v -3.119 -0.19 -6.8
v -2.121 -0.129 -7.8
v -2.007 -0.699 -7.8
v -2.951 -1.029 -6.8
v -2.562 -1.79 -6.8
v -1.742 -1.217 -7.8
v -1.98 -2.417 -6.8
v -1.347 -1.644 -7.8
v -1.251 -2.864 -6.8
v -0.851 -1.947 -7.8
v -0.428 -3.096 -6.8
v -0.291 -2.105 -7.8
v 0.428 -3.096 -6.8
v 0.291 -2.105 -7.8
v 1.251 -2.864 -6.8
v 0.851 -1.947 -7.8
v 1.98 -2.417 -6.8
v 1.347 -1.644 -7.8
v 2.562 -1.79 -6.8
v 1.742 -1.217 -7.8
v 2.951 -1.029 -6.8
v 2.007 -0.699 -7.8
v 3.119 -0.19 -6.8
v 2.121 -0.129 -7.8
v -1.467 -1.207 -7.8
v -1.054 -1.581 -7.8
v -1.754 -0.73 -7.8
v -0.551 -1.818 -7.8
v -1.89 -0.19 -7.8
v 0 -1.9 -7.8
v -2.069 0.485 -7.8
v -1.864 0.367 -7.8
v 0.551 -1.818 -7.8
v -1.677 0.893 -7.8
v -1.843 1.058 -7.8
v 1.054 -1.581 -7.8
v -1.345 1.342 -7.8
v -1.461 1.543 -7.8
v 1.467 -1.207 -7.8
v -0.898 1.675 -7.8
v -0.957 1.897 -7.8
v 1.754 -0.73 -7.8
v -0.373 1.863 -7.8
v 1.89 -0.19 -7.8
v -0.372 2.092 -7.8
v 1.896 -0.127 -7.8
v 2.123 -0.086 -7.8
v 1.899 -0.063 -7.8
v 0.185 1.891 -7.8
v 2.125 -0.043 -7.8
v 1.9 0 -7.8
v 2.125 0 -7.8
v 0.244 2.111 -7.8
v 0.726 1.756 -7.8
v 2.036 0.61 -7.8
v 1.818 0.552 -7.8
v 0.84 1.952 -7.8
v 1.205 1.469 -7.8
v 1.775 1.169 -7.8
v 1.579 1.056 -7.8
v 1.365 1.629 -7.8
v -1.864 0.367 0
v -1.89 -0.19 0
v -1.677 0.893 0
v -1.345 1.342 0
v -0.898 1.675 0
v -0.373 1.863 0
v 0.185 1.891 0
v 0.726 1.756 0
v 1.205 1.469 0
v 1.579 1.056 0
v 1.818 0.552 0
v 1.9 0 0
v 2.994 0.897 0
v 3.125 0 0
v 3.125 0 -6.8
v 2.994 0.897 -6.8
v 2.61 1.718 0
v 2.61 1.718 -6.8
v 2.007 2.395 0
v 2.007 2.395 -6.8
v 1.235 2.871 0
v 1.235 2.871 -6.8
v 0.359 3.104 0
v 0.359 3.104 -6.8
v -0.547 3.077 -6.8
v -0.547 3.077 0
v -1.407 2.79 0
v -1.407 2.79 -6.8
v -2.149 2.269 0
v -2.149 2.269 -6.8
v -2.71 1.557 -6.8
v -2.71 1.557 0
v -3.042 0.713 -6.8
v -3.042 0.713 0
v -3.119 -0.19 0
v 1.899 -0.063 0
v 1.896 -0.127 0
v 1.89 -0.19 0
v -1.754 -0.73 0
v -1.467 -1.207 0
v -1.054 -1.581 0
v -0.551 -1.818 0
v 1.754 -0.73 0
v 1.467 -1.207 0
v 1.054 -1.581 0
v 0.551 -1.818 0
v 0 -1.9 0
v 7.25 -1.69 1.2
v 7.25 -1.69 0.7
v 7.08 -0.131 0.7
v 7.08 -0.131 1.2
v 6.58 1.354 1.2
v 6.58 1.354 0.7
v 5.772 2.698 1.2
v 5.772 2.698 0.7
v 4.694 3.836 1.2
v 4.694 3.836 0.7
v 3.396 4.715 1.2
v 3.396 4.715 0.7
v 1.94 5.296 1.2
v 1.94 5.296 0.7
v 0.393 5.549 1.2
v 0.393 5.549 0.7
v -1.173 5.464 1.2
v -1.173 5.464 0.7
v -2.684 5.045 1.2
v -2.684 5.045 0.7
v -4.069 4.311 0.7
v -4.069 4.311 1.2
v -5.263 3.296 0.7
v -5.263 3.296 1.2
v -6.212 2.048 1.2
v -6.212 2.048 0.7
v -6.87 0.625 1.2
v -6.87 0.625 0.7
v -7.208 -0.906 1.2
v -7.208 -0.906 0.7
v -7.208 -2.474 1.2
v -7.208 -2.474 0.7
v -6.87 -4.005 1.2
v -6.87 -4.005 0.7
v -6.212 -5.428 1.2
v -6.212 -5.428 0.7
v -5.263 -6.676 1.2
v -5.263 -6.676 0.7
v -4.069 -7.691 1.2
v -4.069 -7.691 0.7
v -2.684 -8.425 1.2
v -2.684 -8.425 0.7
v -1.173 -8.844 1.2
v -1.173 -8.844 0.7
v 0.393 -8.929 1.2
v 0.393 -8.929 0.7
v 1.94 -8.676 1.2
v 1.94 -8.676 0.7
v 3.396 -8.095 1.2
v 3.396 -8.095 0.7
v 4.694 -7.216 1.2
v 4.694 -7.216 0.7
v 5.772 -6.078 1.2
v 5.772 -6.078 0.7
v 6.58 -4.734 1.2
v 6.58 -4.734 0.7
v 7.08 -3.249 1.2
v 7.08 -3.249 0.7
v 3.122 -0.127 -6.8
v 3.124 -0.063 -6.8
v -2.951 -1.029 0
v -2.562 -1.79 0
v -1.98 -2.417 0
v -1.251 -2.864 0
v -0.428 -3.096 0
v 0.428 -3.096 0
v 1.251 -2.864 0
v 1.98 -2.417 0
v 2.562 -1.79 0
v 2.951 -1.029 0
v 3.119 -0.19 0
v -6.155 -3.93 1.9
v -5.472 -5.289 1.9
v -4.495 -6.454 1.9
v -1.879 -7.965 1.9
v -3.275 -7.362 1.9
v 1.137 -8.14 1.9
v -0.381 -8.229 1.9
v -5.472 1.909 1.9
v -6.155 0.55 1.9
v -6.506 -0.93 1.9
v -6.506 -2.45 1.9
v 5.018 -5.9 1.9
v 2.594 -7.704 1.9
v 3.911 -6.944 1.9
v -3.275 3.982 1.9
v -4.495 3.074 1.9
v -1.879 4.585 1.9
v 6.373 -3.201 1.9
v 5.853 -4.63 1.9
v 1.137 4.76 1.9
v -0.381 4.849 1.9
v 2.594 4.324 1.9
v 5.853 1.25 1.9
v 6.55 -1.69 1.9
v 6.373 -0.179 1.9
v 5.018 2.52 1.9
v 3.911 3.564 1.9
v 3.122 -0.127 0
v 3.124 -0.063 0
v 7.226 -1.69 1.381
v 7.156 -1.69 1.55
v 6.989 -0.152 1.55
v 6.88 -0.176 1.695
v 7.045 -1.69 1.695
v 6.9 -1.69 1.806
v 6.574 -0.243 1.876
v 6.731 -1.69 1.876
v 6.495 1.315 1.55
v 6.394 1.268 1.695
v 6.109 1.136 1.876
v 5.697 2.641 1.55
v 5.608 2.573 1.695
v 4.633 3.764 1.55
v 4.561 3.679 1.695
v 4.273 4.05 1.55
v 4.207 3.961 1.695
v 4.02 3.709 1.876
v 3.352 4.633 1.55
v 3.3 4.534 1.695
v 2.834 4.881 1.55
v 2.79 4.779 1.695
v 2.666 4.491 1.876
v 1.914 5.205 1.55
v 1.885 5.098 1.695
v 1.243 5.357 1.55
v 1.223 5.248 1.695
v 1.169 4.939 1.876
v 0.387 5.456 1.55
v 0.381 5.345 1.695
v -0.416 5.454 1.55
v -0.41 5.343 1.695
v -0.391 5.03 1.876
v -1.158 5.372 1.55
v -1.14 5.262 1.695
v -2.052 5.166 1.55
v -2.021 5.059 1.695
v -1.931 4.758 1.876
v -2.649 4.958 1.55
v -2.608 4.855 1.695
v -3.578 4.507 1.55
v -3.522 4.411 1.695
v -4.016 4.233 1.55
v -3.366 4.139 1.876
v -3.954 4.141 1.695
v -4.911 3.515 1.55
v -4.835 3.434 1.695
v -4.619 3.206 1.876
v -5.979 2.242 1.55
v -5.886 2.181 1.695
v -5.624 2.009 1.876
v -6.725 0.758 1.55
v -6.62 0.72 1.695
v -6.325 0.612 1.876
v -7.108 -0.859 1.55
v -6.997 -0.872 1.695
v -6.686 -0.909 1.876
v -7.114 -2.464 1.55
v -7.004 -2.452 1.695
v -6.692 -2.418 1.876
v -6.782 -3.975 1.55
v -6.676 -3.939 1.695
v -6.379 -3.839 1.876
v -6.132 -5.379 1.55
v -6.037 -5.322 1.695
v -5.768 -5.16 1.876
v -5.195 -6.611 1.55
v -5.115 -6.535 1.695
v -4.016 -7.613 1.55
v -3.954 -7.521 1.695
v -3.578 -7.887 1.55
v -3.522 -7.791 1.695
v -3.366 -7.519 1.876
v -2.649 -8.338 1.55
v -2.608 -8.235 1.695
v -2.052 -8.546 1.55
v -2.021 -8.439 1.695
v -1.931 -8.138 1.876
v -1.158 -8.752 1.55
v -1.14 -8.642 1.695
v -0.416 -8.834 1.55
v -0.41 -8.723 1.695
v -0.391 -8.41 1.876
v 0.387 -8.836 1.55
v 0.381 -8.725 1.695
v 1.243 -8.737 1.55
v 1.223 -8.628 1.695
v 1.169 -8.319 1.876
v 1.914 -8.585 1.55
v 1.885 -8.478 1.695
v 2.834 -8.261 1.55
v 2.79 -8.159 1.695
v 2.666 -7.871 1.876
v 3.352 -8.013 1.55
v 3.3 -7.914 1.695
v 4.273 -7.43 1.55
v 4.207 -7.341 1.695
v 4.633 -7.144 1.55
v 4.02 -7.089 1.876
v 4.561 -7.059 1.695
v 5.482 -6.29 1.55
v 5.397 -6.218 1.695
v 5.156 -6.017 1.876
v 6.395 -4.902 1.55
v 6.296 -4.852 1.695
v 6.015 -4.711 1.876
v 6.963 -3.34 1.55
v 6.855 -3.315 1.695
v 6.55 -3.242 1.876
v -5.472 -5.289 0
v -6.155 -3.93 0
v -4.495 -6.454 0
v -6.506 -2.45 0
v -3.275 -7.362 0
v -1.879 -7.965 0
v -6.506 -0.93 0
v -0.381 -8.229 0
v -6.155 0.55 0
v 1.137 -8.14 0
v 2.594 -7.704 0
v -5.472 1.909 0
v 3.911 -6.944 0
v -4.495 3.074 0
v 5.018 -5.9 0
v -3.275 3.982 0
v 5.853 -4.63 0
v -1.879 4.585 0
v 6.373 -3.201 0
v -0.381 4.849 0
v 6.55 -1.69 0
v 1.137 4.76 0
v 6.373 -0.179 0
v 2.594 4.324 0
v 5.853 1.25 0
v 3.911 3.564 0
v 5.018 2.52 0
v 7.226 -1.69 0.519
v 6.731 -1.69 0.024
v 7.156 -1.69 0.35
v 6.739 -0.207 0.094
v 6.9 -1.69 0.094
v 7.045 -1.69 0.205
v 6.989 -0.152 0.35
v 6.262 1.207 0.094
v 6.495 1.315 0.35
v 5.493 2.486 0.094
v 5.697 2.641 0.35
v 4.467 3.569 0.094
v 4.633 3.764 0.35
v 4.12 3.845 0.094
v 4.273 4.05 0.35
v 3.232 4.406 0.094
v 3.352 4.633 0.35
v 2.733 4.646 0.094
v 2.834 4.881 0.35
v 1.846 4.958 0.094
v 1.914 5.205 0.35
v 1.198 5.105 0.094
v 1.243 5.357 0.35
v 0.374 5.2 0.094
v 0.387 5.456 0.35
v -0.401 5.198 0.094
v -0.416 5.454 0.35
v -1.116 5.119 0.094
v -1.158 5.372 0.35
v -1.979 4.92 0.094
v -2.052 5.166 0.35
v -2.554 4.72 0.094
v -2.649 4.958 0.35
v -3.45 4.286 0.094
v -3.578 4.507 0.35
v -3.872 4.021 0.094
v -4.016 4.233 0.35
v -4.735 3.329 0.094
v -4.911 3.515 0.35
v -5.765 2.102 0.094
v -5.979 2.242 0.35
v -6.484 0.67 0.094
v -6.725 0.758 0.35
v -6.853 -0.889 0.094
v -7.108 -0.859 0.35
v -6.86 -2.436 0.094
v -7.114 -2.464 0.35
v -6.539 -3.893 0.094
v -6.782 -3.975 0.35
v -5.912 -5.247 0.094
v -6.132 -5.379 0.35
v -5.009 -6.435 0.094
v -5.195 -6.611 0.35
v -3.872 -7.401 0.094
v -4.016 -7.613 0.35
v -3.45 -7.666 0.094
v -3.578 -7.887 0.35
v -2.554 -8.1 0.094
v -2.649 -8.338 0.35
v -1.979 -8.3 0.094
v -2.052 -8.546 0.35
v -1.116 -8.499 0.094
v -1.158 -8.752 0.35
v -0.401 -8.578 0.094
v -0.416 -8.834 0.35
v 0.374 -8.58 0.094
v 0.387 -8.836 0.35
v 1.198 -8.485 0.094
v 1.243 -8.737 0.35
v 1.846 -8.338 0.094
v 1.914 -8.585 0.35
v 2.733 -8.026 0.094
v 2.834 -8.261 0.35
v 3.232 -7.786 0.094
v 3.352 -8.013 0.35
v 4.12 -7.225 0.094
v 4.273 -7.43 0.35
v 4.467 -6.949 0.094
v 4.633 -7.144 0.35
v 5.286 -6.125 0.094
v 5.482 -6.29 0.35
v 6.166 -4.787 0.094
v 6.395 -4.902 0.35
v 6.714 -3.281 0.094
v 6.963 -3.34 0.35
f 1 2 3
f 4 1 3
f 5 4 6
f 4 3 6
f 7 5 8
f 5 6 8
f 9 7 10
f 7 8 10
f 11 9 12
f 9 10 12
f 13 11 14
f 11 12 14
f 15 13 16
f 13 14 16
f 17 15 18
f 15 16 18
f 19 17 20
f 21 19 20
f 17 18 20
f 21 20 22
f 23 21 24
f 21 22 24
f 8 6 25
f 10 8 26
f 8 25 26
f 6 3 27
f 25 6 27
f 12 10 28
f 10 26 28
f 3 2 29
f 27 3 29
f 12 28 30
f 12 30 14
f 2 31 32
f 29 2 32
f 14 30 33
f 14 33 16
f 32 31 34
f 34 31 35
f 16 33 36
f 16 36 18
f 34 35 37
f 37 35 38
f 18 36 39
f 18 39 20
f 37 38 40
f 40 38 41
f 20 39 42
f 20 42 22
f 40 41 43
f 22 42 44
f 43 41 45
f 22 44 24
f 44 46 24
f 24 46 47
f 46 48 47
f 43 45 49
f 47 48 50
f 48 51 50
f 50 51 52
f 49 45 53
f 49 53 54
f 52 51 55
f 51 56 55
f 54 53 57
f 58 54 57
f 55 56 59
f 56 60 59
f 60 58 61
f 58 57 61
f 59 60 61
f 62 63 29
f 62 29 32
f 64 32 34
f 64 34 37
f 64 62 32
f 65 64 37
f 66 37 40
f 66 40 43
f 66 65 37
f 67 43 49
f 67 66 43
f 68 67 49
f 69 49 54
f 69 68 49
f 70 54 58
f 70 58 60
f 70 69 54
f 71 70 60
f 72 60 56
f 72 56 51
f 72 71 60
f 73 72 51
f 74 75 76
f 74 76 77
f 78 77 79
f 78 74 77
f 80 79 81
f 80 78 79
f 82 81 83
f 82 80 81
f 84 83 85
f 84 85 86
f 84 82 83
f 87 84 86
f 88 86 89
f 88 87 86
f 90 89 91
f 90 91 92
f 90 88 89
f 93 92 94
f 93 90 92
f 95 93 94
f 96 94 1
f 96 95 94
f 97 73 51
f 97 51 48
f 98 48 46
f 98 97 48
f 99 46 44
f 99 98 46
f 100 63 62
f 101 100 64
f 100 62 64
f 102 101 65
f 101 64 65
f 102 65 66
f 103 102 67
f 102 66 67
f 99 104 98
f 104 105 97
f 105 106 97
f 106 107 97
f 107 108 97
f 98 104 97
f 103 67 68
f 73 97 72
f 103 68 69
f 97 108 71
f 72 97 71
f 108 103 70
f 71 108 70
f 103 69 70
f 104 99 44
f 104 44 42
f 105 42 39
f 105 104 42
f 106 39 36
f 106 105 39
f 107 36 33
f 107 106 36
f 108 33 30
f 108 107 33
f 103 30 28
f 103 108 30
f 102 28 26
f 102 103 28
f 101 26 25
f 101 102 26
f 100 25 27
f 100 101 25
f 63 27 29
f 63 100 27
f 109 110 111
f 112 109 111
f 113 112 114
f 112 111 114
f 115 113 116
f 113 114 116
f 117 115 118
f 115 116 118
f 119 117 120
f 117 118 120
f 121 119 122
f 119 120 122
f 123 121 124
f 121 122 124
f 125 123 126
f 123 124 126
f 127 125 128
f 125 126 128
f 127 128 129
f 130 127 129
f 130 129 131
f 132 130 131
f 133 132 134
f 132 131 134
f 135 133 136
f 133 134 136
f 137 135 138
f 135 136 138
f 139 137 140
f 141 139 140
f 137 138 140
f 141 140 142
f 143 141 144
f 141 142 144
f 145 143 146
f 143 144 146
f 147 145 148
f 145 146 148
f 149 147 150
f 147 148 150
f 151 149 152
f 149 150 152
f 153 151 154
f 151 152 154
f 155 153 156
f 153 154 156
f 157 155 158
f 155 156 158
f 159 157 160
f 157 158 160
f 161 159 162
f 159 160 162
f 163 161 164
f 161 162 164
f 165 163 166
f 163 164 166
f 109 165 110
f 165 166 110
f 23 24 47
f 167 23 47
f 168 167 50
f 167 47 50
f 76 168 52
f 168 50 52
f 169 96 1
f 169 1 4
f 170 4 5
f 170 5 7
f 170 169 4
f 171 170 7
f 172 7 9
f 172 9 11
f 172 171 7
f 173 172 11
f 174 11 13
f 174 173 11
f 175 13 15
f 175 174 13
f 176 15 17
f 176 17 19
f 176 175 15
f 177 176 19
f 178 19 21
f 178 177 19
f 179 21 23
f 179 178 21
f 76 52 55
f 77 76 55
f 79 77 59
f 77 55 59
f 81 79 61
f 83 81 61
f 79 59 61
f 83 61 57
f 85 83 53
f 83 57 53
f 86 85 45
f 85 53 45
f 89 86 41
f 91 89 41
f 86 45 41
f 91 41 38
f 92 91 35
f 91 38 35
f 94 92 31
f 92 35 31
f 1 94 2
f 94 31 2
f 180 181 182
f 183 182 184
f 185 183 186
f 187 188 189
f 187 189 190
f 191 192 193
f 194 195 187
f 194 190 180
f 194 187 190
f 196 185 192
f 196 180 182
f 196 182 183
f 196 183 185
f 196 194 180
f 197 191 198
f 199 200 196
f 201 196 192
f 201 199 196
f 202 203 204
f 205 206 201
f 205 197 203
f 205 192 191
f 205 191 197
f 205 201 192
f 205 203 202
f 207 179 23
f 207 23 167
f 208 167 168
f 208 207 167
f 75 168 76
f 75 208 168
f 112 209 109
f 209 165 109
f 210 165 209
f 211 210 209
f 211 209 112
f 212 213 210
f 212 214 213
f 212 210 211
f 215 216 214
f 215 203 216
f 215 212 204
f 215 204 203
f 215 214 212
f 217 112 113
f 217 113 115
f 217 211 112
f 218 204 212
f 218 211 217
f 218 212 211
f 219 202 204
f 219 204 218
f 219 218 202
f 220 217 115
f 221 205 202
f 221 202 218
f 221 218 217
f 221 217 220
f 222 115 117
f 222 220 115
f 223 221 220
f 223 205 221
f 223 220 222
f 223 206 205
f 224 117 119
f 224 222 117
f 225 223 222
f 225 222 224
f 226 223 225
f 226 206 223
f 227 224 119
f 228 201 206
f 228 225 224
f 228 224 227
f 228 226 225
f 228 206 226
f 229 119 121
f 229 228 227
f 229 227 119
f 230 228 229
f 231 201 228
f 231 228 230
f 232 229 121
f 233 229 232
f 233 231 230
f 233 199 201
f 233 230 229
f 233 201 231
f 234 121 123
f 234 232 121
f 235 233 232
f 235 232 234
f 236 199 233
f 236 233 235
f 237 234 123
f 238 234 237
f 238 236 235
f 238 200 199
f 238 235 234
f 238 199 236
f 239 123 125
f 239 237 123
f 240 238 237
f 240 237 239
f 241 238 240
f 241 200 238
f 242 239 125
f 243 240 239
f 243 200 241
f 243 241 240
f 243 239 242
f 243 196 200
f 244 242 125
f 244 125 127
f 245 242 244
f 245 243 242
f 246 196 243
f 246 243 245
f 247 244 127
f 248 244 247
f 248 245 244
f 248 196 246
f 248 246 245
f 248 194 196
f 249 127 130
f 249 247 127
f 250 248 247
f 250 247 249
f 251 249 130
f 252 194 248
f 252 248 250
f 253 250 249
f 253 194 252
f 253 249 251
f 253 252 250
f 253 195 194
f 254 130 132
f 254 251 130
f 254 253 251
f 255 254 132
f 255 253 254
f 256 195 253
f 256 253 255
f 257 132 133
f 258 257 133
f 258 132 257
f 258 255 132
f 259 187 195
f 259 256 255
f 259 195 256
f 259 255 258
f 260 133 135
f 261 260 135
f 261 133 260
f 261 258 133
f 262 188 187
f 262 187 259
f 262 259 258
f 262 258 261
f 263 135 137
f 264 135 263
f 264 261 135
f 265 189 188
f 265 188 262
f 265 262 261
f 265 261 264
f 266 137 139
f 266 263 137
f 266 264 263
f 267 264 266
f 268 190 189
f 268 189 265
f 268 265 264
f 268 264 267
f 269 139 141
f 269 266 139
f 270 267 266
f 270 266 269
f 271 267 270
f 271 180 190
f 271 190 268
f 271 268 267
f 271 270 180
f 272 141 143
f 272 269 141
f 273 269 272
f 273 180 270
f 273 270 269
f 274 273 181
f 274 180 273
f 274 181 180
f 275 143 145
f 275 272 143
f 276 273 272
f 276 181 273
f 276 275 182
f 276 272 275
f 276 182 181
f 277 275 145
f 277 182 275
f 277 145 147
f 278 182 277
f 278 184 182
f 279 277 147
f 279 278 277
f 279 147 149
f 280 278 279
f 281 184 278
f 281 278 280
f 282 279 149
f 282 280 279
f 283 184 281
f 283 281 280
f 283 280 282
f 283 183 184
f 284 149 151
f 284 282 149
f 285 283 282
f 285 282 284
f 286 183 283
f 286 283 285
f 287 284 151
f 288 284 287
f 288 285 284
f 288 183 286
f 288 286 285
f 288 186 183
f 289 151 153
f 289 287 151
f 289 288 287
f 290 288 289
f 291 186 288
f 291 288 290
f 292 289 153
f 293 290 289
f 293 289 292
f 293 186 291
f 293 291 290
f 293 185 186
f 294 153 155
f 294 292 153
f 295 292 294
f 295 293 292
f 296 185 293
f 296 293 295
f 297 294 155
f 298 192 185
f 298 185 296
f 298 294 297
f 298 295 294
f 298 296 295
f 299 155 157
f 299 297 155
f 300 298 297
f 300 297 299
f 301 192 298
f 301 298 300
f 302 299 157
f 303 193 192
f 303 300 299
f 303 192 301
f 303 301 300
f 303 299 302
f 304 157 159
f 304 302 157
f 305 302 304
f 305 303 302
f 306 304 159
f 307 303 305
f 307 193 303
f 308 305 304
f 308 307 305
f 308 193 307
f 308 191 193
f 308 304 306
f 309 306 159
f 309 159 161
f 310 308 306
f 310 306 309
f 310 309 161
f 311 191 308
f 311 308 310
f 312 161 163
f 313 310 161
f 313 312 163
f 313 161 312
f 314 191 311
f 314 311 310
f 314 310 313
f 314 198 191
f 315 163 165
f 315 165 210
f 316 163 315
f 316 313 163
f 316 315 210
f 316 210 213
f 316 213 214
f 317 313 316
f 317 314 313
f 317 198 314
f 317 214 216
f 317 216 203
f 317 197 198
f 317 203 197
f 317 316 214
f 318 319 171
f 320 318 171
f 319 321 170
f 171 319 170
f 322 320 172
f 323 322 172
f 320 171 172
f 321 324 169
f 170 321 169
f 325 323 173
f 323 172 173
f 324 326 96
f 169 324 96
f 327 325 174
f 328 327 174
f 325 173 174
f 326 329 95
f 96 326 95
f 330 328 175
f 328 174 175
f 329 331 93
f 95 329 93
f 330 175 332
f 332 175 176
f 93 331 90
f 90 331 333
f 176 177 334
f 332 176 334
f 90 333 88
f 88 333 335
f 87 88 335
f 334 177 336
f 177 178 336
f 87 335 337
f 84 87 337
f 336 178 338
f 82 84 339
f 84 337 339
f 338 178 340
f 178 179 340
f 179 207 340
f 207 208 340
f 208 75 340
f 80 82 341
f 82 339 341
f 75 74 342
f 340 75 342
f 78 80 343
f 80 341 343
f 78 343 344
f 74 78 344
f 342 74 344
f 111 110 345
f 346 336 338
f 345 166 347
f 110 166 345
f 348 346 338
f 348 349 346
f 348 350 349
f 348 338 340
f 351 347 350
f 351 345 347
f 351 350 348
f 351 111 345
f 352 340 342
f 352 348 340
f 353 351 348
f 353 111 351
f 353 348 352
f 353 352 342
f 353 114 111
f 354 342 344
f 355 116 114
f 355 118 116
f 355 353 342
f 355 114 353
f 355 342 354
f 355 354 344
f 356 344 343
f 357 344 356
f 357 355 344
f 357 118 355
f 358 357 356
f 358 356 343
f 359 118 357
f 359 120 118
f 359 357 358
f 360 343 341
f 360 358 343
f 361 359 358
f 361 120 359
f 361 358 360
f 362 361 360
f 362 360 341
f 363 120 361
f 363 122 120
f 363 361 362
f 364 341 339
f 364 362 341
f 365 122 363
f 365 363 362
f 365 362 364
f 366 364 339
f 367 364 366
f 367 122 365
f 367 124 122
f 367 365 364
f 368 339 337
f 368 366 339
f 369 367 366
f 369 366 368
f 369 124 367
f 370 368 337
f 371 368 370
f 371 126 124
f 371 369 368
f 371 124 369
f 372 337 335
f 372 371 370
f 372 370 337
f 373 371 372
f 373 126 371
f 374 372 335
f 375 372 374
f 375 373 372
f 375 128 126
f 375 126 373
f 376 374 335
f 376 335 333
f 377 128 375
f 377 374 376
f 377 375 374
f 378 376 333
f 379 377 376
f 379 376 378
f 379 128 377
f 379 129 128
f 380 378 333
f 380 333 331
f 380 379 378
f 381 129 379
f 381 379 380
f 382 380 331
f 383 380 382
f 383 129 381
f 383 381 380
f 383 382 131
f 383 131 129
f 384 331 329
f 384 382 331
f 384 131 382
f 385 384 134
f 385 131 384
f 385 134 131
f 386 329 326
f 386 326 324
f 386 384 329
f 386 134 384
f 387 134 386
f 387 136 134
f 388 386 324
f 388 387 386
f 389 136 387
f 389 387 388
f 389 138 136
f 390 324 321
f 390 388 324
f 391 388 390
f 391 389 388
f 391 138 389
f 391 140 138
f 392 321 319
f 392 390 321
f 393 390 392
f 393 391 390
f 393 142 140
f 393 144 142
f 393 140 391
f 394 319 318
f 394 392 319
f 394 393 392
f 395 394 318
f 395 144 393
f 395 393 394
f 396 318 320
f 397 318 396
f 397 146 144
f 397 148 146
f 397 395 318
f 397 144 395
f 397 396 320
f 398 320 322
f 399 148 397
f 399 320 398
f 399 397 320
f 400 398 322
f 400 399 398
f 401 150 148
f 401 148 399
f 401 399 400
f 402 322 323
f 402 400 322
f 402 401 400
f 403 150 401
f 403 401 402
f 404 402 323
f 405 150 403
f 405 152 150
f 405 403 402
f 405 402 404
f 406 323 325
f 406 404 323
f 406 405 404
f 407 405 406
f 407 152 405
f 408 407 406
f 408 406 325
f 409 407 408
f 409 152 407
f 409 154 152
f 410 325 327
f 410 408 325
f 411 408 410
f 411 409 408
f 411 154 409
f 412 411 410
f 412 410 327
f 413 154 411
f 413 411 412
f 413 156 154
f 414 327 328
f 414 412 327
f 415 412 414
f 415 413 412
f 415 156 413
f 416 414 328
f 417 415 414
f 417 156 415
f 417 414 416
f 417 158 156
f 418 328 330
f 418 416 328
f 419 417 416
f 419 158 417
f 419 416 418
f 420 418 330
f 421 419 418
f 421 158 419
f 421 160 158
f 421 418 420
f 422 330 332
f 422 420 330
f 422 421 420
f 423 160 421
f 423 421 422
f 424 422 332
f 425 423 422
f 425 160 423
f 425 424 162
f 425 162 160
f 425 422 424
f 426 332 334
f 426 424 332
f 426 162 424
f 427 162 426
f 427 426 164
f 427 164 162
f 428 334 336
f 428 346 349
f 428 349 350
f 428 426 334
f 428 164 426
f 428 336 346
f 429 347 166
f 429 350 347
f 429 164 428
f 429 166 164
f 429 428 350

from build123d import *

# Parameters (mm, degrees)
F1_DEPTH = 7.8
F0_R     = 7.25
F2_DEPTH = 1.9
F3_SIZE  = 1
F4_R     = 0.7


# Not quite as in the source:
# - a feature names something its author has since deleted; it is built from what else it names


with BuildPart() as f1:
    # F0 (on Top) → F1 (new body)
    with BuildSketch(Plane.XY):
        with BuildLine():
            ThreePointArc((1.8904761229, -0.1900000758), (0, -1.9), (-1.8904761229, -0.1900000758))
            Line((-1.8904761229, -0.1900000758), (-3.1192186475, -0.1900000758))
            ThreePointArc((-3.1192186475, -0.1900000758), (0, -3.125), (3.1192186475, -0.1900000758))
            Line((3.1192186475, -0.1900000758), (1.8904761229, -0.1900000758))
        make_face()
        with BuildLine():
            ThreePointArc((-1.8904761229, -0.1900000758), (-0.0951193107, 1.897617537), (1.9, 0))
            ThreePointArc((1.9, 0), (1.897617537, -0.0951193107), (1.8904761229, -0.1900000758))
            Line((1.8904761229, -0.1900000758), (3.1192186475, -0.1900000758))
            ThreePointArc((3.1192186475, -0.1900000758), (3.1235543275, -0.0950440067), (3.125, 0))
            ThreePointArc((3.125, 0), (-0.0950440067, 3.1235543275), (-3.1192186475, -0.1900000758))
            Line((-3.1192186475, -0.1900000758), (-1.8904761229, -0.1900000758))
        make_face()
    extrude(amount=-F1_DEPTH)

    # F0 (on Top) → F2 (join)
    with BuildSketch(Plane.XY):
        with Locations((2.98e-08, -1.6900000758)):
            Circle(F0_R)
        Polygon((2.5797043927, -5.2021308802), (0, -7.9360147938), (-2.5797043927, -5.2021308802), align=None, mode=Mode.SUBTRACT)
        with BuildLine():
            Line((-5.4999999702, -0.1900000758), (-3.1192186475, -0.1900000758))
            ThreePointArc((-3.1192186475, -0.1900000758), (-0.0950440067, 3.1235543275), (3.125, 0))
            ThreePointArc((3.125, 0), (3.1235543275, -0.0950440067), (3.1192186475, -0.1900000758))
            Line((3.1192186475, -0.1900000758), (5.5000000298, -0.1900000758))
            Line((5.5000000298, -0.1900000758), (5.5000000298, -3.1900000758))
            Line((5.5000000298, -3.1900000758), (-5.4999999702, -3.1900000758))
            Line((-5.4999999702, -3.1900000758), (-5.4999999702, -0.1900000758))
        make_face(mode=Mode.SUBTRACT)
        with BuildLine():
            ThreePointArc((3.1192186475, -0.1900000758), (0, -3.125), (-3.1192186475, -0.1900000758))
            Line((-3.1192186475, -0.1900000758), (-5.4999999702, -0.1900000758))
            Line((-5.4999999702, -0.1900000758), (-5.4999999702, -3.1900000758))
            Line((-5.4999999702, -3.1900000758), (5.5000000298, -3.1900000758))
            Line((5.5000000298, -3.1900000758), (5.5000000298, -0.1900000758))
            Line((5.5000000298, -0.1900000758), (3.1192186475, -0.1900000758))
        make_face()
        with BuildLine():
            ThreePointArc((-1.8904761229, -0.1900000758), (-0.0951193107, 1.897617537), (1.9, 0))
            ThreePointArc((1.9, 0), (1.897617537, -0.0951193107), (1.8904761229, -0.1900000758))
            Line((1.8904761229, -0.1900000758), (3.1192186475, -0.1900000758))
            ThreePointArc((3.1192186475, -0.1900000758), (3.1235543275, -0.0950440067), (3.125, 0))
            ThreePointArc((3.125, 0), (-0.0950440067, 3.1235543275), (-3.1192186475, -0.1900000758))
            Line((-3.1192186475, -0.1900000758), (-1.8904761229, -0.1900000758))
        make_face()
        with BuildLine():
            ThreePointArc((1.8904761229, -0.1900000758), (0, -1.9), (-1.8904761229, -0.1900000758))
            Line((-1.8904761229, -0.1900000758), (-3.1192186475, -0.1900000758))
            ThreePointArc((-3.1192186475, -0.1900000758), (0, -3.125), (3.1192186475, -0.1900000758))
            Line((3.1192186475, -0.1900000758), (1.8904761229, -0.1900000758))
        make_face()
        Polygon((-2.5797043927, -5.2021308802), (0, -7.9360147938), (2.5797043927, -5.2021308802), align=None)
        with BuildLine():
            ThreePointArc((1.8904761229, -0.1900000758), (1.897617537, -0.0951193107), (1.9, 0))
            ThreePointArc((1.9, 0), (-0.0951193107, 1.897617537), (-1.8904761229, -0.1900000758))
            Line((-1.8904761229, -0.1900000758), (1.8904761229, -0.1900000758))
        make_face()
        with BuildLine():
            Line((1.8904761229, -0.1900000758), (-1.8904761229, -0.1900000758))
            ThreePointArc((-1.8904761229, -0.1900000758), (0, -1.9), (1.8904761229, -0.1900000758))
        make_face()
    extrude(amount=F2_DEPTH)

    # F3
    f3_edges = [f1.edges().sort_by_distance(p)[0] for p in [
        (3.119219, 0.19, -7.8),
    ]]
    chamfer(f3_edges, length=F3_SIZE)

    # F4
    f4_edges = [f1.edges().sort_by_distance(p)[0] for p in [
        (-7.25, -1.69, 0),
        (-7.25, -1.69, 1.9),
    ]]
    fillet(f4_edges, radius=F4_R)


solid = f1.part
